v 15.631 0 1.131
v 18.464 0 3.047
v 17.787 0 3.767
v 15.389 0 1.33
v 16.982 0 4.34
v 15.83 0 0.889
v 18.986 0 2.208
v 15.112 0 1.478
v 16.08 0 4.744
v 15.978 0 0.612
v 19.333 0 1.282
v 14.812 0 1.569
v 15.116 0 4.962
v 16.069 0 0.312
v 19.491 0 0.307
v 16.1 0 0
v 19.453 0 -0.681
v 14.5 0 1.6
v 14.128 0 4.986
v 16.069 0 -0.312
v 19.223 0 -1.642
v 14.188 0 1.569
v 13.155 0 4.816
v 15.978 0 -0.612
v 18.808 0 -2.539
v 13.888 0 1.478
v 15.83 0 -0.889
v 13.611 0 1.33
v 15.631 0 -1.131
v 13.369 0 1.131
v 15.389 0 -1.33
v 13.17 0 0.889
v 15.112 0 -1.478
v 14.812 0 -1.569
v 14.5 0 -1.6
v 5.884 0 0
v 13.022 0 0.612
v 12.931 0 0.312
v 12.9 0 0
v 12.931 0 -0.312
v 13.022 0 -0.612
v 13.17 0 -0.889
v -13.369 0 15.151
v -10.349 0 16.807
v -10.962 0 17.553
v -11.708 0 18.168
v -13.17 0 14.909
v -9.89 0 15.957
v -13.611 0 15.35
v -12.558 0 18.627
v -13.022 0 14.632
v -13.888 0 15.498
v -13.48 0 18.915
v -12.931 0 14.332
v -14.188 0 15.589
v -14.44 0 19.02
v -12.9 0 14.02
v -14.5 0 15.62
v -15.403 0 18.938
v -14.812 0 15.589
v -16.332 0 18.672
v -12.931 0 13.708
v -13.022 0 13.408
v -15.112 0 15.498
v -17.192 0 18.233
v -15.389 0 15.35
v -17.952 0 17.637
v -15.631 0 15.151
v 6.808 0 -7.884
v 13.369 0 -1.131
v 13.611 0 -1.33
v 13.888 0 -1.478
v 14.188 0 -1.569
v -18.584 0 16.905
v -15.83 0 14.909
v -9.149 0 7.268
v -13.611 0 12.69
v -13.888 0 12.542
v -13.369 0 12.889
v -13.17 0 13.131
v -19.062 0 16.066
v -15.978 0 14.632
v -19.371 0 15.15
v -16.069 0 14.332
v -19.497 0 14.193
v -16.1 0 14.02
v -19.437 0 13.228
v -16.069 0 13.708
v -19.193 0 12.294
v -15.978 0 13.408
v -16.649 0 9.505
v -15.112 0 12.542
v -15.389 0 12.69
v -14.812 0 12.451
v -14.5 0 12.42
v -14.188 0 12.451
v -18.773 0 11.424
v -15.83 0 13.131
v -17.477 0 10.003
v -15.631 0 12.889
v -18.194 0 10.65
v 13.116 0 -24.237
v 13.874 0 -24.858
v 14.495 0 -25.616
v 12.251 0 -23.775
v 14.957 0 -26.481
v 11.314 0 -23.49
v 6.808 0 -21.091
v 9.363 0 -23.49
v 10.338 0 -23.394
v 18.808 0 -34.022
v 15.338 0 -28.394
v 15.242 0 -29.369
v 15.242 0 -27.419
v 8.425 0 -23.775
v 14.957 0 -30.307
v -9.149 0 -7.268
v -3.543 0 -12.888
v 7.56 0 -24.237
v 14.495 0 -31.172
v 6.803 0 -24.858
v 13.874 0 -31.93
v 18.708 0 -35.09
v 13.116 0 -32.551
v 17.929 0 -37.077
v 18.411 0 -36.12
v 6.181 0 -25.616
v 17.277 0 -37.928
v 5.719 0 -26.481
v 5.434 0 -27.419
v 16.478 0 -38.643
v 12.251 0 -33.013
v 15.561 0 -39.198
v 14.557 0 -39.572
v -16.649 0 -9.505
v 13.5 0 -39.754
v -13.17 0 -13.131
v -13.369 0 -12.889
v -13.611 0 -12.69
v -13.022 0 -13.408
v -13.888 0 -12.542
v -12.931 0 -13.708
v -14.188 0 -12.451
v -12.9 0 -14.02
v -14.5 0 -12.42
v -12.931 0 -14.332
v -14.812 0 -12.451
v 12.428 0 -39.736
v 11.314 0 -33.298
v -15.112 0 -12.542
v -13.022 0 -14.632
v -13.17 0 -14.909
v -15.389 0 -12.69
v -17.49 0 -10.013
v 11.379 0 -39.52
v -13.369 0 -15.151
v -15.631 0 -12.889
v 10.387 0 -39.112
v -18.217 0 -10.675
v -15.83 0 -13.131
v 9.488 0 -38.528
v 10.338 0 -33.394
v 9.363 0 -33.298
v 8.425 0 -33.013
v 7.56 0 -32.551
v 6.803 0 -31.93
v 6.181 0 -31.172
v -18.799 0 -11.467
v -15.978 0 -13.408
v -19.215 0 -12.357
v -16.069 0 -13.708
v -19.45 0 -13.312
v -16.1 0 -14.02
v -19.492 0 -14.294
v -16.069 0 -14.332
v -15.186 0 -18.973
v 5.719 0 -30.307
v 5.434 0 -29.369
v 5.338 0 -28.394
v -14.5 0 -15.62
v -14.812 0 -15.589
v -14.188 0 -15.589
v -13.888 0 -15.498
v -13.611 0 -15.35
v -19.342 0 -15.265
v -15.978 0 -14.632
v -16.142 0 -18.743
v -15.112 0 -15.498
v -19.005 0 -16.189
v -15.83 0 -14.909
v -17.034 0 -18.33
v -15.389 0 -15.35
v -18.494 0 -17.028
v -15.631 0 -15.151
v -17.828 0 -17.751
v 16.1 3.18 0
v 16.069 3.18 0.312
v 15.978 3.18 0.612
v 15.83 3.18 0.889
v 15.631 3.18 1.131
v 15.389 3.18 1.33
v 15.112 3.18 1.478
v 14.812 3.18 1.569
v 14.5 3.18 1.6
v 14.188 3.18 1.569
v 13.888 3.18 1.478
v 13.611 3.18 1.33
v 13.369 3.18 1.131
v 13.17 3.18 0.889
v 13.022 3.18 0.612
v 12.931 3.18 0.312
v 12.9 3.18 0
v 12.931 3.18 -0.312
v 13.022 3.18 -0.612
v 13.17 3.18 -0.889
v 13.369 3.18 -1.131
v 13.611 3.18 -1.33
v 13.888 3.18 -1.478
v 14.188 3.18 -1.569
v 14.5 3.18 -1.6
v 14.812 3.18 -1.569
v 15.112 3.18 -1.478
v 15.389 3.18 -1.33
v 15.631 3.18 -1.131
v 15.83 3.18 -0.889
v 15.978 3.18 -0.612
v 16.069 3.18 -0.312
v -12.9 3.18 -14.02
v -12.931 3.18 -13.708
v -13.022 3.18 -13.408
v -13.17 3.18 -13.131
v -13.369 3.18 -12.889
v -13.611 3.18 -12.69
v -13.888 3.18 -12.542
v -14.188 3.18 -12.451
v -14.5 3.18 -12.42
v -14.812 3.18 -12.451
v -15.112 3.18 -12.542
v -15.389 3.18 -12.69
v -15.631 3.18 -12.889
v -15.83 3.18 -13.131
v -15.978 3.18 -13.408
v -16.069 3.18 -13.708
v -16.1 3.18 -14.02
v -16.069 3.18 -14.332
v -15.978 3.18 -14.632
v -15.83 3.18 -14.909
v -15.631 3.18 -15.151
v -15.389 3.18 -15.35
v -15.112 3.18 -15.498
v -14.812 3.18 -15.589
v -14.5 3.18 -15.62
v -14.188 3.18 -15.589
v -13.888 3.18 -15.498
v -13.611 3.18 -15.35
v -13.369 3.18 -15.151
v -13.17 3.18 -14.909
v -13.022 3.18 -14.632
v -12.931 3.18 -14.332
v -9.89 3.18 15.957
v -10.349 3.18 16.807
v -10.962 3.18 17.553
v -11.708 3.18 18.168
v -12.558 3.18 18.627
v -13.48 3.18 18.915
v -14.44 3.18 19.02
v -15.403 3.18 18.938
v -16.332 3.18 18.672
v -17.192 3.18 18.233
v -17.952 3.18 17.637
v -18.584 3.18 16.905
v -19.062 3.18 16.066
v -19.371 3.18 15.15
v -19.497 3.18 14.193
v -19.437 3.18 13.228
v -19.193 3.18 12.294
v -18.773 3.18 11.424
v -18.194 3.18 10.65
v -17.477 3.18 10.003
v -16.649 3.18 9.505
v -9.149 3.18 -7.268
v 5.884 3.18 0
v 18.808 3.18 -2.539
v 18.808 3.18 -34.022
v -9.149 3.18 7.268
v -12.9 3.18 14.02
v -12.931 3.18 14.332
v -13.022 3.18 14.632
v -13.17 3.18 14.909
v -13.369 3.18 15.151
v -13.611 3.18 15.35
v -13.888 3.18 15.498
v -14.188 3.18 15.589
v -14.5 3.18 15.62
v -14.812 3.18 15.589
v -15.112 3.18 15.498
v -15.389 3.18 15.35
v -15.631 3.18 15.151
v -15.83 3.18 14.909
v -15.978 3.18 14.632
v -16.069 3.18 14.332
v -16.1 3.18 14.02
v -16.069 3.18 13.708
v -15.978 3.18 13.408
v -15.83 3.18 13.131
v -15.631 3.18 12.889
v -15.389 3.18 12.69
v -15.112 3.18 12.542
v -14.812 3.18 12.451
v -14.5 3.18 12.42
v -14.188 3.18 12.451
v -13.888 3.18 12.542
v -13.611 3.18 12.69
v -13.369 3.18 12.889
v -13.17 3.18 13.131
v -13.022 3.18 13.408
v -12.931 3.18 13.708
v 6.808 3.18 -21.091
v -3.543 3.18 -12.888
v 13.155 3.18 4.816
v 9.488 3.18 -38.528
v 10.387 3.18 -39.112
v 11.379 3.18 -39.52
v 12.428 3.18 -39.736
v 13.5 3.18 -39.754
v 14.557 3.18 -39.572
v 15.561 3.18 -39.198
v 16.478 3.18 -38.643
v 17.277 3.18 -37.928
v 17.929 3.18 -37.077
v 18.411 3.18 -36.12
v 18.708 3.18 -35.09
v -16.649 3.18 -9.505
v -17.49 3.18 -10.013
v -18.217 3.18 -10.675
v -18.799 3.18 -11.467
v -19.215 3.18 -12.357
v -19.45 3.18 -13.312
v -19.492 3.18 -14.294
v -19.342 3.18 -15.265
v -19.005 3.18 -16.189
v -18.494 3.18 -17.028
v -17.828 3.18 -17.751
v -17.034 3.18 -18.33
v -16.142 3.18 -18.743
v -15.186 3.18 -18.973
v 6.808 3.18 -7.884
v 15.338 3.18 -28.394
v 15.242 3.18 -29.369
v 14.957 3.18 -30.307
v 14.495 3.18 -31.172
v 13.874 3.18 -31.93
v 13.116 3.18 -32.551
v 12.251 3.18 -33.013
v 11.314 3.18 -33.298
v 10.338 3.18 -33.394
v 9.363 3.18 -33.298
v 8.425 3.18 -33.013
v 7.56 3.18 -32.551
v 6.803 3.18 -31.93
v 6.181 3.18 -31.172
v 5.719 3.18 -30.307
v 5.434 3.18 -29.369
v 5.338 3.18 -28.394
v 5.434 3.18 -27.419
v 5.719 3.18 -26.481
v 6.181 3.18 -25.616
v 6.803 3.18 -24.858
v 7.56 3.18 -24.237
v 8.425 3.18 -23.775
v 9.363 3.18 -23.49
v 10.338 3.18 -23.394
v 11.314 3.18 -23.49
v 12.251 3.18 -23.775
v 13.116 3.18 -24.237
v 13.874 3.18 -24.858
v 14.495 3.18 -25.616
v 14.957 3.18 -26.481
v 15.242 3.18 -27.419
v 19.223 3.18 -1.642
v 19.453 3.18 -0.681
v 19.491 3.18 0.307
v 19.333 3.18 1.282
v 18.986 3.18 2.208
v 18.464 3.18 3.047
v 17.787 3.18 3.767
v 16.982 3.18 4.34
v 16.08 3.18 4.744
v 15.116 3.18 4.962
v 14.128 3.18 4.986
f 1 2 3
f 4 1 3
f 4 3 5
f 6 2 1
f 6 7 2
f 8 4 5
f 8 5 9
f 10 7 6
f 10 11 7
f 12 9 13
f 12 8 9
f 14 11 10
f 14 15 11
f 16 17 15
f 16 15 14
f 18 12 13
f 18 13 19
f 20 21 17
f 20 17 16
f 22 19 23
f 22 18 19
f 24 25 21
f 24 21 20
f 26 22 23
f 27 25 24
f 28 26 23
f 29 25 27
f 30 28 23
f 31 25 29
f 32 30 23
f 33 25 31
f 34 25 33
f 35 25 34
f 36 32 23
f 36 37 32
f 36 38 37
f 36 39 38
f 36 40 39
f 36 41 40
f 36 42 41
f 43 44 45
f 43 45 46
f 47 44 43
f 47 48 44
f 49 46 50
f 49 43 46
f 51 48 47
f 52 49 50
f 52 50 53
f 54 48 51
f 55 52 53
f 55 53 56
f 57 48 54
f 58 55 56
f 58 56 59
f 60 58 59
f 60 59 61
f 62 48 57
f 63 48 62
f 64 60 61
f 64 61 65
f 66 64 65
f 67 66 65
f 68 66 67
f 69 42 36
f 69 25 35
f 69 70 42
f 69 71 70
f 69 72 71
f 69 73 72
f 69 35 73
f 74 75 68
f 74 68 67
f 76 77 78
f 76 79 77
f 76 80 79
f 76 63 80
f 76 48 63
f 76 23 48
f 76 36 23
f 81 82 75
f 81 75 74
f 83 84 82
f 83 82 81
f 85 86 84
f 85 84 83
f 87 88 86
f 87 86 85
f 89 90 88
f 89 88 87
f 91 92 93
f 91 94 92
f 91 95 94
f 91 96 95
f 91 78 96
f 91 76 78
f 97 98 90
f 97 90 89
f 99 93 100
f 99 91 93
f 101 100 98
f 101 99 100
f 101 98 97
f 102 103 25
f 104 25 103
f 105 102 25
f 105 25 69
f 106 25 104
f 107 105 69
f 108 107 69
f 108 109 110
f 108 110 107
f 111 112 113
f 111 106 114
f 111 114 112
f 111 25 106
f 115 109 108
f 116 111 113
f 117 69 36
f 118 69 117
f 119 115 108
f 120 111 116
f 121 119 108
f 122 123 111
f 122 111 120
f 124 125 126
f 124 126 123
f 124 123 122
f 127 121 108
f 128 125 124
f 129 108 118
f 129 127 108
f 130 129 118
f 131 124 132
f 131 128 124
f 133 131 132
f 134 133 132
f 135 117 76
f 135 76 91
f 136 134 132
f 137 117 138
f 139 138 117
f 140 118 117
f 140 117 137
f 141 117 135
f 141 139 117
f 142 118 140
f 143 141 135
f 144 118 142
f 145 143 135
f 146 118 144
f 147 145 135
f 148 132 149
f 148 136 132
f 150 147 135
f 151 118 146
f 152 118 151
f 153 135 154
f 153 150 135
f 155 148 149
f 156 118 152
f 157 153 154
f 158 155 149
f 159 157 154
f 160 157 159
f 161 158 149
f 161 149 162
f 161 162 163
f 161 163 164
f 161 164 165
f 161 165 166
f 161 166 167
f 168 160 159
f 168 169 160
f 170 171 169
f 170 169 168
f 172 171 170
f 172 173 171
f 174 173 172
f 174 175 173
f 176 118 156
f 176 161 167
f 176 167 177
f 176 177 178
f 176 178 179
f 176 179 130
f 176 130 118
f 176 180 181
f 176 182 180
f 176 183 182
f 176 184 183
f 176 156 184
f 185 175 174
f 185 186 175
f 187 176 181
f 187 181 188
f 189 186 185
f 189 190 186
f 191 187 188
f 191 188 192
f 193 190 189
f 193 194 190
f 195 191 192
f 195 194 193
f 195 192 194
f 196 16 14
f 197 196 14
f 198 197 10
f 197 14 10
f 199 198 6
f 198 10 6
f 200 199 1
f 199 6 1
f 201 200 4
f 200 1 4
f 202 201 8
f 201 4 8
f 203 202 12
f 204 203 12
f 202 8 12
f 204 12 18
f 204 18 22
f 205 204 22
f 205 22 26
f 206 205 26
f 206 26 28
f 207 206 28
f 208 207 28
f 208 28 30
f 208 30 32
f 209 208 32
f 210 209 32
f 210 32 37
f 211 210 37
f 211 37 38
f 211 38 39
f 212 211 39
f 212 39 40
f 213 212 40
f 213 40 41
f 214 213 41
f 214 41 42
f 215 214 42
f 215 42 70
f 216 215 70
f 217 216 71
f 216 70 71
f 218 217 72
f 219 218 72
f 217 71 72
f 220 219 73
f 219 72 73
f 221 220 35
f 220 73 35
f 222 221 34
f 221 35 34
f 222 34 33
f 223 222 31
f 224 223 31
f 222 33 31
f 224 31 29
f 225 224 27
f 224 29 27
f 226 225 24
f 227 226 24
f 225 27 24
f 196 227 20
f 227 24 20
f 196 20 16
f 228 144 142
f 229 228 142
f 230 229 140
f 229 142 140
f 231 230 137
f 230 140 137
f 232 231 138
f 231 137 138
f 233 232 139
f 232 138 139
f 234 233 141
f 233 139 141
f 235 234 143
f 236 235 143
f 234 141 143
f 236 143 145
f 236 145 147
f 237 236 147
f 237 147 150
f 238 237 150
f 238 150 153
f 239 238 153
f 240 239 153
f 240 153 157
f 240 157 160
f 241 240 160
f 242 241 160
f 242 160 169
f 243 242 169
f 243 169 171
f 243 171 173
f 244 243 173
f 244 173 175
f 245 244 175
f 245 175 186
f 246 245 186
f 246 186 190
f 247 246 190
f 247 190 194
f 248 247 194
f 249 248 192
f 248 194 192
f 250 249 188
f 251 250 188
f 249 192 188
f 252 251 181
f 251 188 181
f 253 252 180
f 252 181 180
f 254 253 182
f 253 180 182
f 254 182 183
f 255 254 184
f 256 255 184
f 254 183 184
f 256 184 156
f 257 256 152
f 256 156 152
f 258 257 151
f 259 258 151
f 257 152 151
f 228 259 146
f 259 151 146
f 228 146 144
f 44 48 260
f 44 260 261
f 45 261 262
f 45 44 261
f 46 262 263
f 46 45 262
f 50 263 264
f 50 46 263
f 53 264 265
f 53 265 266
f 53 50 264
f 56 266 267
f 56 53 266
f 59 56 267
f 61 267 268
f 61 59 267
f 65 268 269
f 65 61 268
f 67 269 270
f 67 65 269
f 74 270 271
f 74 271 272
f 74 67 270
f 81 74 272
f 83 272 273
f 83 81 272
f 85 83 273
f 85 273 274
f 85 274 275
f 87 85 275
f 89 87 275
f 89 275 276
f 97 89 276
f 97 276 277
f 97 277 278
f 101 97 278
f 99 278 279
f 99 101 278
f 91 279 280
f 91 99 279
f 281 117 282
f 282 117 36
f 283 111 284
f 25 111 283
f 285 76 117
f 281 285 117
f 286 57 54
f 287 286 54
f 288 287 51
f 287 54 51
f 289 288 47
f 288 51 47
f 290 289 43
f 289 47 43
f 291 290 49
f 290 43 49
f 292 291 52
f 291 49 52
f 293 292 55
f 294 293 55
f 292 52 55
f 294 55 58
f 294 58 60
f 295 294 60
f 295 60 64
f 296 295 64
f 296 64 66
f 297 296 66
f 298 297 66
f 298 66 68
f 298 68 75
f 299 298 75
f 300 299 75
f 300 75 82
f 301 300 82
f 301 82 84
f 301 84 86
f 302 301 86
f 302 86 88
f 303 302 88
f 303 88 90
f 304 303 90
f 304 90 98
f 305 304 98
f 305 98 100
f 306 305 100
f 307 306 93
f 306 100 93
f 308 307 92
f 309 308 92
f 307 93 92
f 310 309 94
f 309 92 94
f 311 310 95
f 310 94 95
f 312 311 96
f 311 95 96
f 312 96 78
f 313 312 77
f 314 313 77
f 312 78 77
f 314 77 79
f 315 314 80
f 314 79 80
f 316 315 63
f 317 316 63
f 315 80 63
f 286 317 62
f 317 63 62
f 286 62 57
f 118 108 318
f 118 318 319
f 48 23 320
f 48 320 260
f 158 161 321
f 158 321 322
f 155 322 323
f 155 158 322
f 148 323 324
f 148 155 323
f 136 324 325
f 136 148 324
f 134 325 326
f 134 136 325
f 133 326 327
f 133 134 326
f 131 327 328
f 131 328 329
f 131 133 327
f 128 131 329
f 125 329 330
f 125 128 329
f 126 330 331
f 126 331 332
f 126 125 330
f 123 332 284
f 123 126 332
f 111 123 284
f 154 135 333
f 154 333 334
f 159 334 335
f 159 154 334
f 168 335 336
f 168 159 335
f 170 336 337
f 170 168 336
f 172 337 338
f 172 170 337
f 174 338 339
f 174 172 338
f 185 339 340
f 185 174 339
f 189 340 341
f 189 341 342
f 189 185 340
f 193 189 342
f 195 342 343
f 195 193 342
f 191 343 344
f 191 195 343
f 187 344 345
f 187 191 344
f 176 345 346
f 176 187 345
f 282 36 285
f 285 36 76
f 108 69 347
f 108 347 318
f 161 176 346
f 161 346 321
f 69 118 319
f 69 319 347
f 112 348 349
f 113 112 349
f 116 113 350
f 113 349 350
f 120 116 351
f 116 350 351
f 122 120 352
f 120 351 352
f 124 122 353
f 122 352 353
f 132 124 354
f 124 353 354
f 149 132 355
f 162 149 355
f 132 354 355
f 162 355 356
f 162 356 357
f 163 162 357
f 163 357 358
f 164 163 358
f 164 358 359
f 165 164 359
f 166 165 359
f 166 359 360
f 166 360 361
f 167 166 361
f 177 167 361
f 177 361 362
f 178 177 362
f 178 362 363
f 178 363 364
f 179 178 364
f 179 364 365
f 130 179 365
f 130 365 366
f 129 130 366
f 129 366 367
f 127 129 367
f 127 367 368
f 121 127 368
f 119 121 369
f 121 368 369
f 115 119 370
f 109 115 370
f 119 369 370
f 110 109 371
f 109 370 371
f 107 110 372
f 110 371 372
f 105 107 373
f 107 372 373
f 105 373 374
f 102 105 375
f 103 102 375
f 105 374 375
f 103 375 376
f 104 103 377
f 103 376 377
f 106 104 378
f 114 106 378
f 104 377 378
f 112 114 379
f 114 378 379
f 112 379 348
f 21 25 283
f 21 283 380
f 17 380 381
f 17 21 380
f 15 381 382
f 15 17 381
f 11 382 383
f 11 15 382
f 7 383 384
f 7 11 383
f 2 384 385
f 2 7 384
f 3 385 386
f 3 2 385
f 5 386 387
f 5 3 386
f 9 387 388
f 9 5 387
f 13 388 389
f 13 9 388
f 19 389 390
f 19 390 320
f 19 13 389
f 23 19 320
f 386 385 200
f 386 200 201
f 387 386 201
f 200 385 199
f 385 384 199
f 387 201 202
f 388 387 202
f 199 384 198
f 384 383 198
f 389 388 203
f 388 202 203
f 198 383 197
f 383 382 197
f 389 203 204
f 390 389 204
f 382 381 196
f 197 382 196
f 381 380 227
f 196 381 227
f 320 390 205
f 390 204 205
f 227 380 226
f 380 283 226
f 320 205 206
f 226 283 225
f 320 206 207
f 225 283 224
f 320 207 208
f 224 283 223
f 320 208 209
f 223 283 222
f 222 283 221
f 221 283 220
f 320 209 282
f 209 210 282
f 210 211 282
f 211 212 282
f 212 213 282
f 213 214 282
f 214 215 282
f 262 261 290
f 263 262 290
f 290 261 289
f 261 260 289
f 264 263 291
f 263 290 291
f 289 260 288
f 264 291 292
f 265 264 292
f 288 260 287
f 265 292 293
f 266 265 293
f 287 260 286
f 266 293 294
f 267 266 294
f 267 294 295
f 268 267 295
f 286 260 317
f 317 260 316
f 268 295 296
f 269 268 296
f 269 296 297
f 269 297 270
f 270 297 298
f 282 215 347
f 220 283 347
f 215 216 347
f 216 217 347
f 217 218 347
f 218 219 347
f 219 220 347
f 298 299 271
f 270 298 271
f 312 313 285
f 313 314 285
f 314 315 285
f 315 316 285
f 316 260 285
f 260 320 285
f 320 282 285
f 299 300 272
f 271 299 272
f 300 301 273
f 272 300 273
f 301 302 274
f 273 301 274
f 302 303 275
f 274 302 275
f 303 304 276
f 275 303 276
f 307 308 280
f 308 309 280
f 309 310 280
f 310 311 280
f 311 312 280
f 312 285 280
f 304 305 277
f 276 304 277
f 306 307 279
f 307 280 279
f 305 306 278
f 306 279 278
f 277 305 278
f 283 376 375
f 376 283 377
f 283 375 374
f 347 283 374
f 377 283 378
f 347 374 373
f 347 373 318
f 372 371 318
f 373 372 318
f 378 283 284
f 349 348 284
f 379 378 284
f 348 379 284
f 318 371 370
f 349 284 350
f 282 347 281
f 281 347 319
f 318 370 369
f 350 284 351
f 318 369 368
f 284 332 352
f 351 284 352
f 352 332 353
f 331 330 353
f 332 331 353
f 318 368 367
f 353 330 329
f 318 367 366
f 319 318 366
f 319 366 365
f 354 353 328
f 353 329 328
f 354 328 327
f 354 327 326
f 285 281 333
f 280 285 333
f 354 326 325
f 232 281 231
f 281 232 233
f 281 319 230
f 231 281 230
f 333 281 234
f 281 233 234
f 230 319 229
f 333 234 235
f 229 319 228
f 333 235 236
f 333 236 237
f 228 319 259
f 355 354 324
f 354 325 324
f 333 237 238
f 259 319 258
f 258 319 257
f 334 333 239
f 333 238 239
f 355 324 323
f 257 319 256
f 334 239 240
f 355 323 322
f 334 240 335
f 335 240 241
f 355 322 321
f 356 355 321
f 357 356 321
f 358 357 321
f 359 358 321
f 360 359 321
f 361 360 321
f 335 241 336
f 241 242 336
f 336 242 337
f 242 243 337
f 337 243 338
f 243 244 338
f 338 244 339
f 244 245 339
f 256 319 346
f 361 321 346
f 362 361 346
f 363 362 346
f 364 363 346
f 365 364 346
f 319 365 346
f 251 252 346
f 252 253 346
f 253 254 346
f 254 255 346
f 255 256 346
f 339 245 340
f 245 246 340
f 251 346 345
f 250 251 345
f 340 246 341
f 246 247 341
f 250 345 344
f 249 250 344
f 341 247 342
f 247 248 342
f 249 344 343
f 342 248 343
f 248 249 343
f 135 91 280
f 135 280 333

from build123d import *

# Parameters (mm, degrees)
BOSS_EXTRUDE1_DEPTH            = 3.18
F_3_2_3_2_DIAMETER_HOLE1_D     = 3.2
F_3_2_3_2_DIAMETER_HOLE1_DEPTH = 3.18
F_10_0_10_DIAMETER_HOLE1_D     = 10
F_10_0_10_DIAMETER_HOLE1_DEPTH = 3.18


with BuildPart() as part:
    # Sketch1 → Boss-Extrude1 (new body)
    with BuildSketch(Plane(origin=(0, 0, 0), x_dir=(1, 0, 0), z_dir=(0, 1, 0))):
        with BuildLine():
            Line((-16.648706397, -9.505239672), (-16.648706397, 9.505239672))
            ThreePointArc((-16.648706397, 9.505239672), (-19.441368429, 14.783464504), (-15.185935574, 18.972725753))
            Line((-15.185935574, 18.972725753), (9.48849845, 38.527527259))
            ThreePointArc((9.48849845, 38.527527259), (15.561102251, 39.197729336), (18.807607076, 34.022220261))
            Line((18.807607076, 34.022220261), (18.807607076, 2.538606169))
            ThreePointArc((18.807607076, 2.538606169), (18.464212779, -3.047132594), (13.154706871, -4.815619005))
            Line((13.154706871, -4.815619005), (-9.89031278, -15.956694023))
            ThreePointArc((-9.89031278, -15.956694023), (-17.95245166, -17.636708108), (-16.648706397, -9.505239672))
        make_face()
        Polygon((-9.148706397, 7.267686973), (5.884312306, 0), (-9.148706397, -7.267686973), align=None, mode=Mode.SUBTRACT)
        Polygon((-3.543212985, 12.88819957), (6.807607076, 7.884113458), (6.807607076, 21.091355578), align=None, mode=Mode.SUBTRACT)
    extrude(amount=BOSS_EXTRUDE1_DEPTH)

    # Ø3.2 (3.2) Diameter Hole1
    with Locations(Plane(origin=(0, 3.18, 0), x_dir=(-1, 0, 0), z_dir=(0, 1, 0))):
        with Locations((-14.5, 0), (14.5, 14.02), (14.5, -14.02)):
            Hole(F_3_2_3_2_DIAMETER_HOLE1_D / 2, depth=F_3_2_3_2_DIAMETER_HOLE1_DEPTH)

    # Ø10.0 (10) Diameter Hole1
    with Locations(Plane(origin=(0, 0, 0), x_dir=(-1, 0, 0), z_dir=(0, -1, 0))):
        with Locations((-10.338071706, 28.394028492)):
            Hole(F_10_0_10_DIAMETER_HOLE1_D / 2, depth=F_10_0_10_DIAMETER_HOLE1_DEPTH)


solid = part.part
